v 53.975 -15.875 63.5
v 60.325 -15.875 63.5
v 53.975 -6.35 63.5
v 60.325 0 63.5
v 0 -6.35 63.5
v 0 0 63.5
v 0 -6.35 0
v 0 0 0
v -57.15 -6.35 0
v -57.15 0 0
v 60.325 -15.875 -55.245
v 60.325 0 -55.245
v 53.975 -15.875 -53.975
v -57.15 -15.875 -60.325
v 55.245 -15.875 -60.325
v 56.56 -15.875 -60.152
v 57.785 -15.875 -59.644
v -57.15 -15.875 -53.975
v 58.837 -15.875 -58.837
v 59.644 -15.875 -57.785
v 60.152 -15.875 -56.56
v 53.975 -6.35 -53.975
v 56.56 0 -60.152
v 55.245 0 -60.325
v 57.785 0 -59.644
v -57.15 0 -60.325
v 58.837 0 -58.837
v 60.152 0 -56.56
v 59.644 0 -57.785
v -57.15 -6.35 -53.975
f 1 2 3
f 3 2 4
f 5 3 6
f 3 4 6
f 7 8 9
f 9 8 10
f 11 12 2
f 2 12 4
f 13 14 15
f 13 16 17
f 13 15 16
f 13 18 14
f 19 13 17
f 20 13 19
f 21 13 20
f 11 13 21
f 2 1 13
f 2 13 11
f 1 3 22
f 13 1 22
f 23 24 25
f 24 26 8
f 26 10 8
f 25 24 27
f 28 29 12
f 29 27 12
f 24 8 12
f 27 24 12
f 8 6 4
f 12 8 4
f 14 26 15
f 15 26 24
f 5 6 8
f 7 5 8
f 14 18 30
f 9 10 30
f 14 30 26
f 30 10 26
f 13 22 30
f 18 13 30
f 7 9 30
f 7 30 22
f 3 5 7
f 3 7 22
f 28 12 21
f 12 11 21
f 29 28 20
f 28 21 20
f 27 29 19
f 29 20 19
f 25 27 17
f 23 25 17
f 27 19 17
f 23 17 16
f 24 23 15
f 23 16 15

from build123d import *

# Parameters (mm, degrees)
F1_DEPTH = 6.35
F3_DEPTH = 9.525
F4_R     = 5.08


with BuildPart() as f1:
    # F0 (on Front) → F1 (new body)
    with BuildSketch(Plane.XZ):
        Polygon((0, 63.5), (0, 0), (-57.15, 0), (-57.15, -60.325), (60.325, -60.325), (60.325, 63.5), align=None)
    extrude(amount=F1_DEPTH)

    # F2 (on face) → F3 (join)
    with BuildSketch(Plane.XZ.offset(6.35)):
        Polygon((-57.15, -53.975), (-57.15, -60.325), (60.325, -60.325), (60.325, 63.5), (53.975, 63.5), (53.975, -53.975), align=None)
    extrude(amount=F3_DEPTH)

    # F4
    f4_edges = [f1.edges().sort_by_distance(p)[0] for p in [
        (60.325, -7.9375, -60.325),
    ]]
    fillet(f4_edges, radius=F4_R)


solid = f1.part
